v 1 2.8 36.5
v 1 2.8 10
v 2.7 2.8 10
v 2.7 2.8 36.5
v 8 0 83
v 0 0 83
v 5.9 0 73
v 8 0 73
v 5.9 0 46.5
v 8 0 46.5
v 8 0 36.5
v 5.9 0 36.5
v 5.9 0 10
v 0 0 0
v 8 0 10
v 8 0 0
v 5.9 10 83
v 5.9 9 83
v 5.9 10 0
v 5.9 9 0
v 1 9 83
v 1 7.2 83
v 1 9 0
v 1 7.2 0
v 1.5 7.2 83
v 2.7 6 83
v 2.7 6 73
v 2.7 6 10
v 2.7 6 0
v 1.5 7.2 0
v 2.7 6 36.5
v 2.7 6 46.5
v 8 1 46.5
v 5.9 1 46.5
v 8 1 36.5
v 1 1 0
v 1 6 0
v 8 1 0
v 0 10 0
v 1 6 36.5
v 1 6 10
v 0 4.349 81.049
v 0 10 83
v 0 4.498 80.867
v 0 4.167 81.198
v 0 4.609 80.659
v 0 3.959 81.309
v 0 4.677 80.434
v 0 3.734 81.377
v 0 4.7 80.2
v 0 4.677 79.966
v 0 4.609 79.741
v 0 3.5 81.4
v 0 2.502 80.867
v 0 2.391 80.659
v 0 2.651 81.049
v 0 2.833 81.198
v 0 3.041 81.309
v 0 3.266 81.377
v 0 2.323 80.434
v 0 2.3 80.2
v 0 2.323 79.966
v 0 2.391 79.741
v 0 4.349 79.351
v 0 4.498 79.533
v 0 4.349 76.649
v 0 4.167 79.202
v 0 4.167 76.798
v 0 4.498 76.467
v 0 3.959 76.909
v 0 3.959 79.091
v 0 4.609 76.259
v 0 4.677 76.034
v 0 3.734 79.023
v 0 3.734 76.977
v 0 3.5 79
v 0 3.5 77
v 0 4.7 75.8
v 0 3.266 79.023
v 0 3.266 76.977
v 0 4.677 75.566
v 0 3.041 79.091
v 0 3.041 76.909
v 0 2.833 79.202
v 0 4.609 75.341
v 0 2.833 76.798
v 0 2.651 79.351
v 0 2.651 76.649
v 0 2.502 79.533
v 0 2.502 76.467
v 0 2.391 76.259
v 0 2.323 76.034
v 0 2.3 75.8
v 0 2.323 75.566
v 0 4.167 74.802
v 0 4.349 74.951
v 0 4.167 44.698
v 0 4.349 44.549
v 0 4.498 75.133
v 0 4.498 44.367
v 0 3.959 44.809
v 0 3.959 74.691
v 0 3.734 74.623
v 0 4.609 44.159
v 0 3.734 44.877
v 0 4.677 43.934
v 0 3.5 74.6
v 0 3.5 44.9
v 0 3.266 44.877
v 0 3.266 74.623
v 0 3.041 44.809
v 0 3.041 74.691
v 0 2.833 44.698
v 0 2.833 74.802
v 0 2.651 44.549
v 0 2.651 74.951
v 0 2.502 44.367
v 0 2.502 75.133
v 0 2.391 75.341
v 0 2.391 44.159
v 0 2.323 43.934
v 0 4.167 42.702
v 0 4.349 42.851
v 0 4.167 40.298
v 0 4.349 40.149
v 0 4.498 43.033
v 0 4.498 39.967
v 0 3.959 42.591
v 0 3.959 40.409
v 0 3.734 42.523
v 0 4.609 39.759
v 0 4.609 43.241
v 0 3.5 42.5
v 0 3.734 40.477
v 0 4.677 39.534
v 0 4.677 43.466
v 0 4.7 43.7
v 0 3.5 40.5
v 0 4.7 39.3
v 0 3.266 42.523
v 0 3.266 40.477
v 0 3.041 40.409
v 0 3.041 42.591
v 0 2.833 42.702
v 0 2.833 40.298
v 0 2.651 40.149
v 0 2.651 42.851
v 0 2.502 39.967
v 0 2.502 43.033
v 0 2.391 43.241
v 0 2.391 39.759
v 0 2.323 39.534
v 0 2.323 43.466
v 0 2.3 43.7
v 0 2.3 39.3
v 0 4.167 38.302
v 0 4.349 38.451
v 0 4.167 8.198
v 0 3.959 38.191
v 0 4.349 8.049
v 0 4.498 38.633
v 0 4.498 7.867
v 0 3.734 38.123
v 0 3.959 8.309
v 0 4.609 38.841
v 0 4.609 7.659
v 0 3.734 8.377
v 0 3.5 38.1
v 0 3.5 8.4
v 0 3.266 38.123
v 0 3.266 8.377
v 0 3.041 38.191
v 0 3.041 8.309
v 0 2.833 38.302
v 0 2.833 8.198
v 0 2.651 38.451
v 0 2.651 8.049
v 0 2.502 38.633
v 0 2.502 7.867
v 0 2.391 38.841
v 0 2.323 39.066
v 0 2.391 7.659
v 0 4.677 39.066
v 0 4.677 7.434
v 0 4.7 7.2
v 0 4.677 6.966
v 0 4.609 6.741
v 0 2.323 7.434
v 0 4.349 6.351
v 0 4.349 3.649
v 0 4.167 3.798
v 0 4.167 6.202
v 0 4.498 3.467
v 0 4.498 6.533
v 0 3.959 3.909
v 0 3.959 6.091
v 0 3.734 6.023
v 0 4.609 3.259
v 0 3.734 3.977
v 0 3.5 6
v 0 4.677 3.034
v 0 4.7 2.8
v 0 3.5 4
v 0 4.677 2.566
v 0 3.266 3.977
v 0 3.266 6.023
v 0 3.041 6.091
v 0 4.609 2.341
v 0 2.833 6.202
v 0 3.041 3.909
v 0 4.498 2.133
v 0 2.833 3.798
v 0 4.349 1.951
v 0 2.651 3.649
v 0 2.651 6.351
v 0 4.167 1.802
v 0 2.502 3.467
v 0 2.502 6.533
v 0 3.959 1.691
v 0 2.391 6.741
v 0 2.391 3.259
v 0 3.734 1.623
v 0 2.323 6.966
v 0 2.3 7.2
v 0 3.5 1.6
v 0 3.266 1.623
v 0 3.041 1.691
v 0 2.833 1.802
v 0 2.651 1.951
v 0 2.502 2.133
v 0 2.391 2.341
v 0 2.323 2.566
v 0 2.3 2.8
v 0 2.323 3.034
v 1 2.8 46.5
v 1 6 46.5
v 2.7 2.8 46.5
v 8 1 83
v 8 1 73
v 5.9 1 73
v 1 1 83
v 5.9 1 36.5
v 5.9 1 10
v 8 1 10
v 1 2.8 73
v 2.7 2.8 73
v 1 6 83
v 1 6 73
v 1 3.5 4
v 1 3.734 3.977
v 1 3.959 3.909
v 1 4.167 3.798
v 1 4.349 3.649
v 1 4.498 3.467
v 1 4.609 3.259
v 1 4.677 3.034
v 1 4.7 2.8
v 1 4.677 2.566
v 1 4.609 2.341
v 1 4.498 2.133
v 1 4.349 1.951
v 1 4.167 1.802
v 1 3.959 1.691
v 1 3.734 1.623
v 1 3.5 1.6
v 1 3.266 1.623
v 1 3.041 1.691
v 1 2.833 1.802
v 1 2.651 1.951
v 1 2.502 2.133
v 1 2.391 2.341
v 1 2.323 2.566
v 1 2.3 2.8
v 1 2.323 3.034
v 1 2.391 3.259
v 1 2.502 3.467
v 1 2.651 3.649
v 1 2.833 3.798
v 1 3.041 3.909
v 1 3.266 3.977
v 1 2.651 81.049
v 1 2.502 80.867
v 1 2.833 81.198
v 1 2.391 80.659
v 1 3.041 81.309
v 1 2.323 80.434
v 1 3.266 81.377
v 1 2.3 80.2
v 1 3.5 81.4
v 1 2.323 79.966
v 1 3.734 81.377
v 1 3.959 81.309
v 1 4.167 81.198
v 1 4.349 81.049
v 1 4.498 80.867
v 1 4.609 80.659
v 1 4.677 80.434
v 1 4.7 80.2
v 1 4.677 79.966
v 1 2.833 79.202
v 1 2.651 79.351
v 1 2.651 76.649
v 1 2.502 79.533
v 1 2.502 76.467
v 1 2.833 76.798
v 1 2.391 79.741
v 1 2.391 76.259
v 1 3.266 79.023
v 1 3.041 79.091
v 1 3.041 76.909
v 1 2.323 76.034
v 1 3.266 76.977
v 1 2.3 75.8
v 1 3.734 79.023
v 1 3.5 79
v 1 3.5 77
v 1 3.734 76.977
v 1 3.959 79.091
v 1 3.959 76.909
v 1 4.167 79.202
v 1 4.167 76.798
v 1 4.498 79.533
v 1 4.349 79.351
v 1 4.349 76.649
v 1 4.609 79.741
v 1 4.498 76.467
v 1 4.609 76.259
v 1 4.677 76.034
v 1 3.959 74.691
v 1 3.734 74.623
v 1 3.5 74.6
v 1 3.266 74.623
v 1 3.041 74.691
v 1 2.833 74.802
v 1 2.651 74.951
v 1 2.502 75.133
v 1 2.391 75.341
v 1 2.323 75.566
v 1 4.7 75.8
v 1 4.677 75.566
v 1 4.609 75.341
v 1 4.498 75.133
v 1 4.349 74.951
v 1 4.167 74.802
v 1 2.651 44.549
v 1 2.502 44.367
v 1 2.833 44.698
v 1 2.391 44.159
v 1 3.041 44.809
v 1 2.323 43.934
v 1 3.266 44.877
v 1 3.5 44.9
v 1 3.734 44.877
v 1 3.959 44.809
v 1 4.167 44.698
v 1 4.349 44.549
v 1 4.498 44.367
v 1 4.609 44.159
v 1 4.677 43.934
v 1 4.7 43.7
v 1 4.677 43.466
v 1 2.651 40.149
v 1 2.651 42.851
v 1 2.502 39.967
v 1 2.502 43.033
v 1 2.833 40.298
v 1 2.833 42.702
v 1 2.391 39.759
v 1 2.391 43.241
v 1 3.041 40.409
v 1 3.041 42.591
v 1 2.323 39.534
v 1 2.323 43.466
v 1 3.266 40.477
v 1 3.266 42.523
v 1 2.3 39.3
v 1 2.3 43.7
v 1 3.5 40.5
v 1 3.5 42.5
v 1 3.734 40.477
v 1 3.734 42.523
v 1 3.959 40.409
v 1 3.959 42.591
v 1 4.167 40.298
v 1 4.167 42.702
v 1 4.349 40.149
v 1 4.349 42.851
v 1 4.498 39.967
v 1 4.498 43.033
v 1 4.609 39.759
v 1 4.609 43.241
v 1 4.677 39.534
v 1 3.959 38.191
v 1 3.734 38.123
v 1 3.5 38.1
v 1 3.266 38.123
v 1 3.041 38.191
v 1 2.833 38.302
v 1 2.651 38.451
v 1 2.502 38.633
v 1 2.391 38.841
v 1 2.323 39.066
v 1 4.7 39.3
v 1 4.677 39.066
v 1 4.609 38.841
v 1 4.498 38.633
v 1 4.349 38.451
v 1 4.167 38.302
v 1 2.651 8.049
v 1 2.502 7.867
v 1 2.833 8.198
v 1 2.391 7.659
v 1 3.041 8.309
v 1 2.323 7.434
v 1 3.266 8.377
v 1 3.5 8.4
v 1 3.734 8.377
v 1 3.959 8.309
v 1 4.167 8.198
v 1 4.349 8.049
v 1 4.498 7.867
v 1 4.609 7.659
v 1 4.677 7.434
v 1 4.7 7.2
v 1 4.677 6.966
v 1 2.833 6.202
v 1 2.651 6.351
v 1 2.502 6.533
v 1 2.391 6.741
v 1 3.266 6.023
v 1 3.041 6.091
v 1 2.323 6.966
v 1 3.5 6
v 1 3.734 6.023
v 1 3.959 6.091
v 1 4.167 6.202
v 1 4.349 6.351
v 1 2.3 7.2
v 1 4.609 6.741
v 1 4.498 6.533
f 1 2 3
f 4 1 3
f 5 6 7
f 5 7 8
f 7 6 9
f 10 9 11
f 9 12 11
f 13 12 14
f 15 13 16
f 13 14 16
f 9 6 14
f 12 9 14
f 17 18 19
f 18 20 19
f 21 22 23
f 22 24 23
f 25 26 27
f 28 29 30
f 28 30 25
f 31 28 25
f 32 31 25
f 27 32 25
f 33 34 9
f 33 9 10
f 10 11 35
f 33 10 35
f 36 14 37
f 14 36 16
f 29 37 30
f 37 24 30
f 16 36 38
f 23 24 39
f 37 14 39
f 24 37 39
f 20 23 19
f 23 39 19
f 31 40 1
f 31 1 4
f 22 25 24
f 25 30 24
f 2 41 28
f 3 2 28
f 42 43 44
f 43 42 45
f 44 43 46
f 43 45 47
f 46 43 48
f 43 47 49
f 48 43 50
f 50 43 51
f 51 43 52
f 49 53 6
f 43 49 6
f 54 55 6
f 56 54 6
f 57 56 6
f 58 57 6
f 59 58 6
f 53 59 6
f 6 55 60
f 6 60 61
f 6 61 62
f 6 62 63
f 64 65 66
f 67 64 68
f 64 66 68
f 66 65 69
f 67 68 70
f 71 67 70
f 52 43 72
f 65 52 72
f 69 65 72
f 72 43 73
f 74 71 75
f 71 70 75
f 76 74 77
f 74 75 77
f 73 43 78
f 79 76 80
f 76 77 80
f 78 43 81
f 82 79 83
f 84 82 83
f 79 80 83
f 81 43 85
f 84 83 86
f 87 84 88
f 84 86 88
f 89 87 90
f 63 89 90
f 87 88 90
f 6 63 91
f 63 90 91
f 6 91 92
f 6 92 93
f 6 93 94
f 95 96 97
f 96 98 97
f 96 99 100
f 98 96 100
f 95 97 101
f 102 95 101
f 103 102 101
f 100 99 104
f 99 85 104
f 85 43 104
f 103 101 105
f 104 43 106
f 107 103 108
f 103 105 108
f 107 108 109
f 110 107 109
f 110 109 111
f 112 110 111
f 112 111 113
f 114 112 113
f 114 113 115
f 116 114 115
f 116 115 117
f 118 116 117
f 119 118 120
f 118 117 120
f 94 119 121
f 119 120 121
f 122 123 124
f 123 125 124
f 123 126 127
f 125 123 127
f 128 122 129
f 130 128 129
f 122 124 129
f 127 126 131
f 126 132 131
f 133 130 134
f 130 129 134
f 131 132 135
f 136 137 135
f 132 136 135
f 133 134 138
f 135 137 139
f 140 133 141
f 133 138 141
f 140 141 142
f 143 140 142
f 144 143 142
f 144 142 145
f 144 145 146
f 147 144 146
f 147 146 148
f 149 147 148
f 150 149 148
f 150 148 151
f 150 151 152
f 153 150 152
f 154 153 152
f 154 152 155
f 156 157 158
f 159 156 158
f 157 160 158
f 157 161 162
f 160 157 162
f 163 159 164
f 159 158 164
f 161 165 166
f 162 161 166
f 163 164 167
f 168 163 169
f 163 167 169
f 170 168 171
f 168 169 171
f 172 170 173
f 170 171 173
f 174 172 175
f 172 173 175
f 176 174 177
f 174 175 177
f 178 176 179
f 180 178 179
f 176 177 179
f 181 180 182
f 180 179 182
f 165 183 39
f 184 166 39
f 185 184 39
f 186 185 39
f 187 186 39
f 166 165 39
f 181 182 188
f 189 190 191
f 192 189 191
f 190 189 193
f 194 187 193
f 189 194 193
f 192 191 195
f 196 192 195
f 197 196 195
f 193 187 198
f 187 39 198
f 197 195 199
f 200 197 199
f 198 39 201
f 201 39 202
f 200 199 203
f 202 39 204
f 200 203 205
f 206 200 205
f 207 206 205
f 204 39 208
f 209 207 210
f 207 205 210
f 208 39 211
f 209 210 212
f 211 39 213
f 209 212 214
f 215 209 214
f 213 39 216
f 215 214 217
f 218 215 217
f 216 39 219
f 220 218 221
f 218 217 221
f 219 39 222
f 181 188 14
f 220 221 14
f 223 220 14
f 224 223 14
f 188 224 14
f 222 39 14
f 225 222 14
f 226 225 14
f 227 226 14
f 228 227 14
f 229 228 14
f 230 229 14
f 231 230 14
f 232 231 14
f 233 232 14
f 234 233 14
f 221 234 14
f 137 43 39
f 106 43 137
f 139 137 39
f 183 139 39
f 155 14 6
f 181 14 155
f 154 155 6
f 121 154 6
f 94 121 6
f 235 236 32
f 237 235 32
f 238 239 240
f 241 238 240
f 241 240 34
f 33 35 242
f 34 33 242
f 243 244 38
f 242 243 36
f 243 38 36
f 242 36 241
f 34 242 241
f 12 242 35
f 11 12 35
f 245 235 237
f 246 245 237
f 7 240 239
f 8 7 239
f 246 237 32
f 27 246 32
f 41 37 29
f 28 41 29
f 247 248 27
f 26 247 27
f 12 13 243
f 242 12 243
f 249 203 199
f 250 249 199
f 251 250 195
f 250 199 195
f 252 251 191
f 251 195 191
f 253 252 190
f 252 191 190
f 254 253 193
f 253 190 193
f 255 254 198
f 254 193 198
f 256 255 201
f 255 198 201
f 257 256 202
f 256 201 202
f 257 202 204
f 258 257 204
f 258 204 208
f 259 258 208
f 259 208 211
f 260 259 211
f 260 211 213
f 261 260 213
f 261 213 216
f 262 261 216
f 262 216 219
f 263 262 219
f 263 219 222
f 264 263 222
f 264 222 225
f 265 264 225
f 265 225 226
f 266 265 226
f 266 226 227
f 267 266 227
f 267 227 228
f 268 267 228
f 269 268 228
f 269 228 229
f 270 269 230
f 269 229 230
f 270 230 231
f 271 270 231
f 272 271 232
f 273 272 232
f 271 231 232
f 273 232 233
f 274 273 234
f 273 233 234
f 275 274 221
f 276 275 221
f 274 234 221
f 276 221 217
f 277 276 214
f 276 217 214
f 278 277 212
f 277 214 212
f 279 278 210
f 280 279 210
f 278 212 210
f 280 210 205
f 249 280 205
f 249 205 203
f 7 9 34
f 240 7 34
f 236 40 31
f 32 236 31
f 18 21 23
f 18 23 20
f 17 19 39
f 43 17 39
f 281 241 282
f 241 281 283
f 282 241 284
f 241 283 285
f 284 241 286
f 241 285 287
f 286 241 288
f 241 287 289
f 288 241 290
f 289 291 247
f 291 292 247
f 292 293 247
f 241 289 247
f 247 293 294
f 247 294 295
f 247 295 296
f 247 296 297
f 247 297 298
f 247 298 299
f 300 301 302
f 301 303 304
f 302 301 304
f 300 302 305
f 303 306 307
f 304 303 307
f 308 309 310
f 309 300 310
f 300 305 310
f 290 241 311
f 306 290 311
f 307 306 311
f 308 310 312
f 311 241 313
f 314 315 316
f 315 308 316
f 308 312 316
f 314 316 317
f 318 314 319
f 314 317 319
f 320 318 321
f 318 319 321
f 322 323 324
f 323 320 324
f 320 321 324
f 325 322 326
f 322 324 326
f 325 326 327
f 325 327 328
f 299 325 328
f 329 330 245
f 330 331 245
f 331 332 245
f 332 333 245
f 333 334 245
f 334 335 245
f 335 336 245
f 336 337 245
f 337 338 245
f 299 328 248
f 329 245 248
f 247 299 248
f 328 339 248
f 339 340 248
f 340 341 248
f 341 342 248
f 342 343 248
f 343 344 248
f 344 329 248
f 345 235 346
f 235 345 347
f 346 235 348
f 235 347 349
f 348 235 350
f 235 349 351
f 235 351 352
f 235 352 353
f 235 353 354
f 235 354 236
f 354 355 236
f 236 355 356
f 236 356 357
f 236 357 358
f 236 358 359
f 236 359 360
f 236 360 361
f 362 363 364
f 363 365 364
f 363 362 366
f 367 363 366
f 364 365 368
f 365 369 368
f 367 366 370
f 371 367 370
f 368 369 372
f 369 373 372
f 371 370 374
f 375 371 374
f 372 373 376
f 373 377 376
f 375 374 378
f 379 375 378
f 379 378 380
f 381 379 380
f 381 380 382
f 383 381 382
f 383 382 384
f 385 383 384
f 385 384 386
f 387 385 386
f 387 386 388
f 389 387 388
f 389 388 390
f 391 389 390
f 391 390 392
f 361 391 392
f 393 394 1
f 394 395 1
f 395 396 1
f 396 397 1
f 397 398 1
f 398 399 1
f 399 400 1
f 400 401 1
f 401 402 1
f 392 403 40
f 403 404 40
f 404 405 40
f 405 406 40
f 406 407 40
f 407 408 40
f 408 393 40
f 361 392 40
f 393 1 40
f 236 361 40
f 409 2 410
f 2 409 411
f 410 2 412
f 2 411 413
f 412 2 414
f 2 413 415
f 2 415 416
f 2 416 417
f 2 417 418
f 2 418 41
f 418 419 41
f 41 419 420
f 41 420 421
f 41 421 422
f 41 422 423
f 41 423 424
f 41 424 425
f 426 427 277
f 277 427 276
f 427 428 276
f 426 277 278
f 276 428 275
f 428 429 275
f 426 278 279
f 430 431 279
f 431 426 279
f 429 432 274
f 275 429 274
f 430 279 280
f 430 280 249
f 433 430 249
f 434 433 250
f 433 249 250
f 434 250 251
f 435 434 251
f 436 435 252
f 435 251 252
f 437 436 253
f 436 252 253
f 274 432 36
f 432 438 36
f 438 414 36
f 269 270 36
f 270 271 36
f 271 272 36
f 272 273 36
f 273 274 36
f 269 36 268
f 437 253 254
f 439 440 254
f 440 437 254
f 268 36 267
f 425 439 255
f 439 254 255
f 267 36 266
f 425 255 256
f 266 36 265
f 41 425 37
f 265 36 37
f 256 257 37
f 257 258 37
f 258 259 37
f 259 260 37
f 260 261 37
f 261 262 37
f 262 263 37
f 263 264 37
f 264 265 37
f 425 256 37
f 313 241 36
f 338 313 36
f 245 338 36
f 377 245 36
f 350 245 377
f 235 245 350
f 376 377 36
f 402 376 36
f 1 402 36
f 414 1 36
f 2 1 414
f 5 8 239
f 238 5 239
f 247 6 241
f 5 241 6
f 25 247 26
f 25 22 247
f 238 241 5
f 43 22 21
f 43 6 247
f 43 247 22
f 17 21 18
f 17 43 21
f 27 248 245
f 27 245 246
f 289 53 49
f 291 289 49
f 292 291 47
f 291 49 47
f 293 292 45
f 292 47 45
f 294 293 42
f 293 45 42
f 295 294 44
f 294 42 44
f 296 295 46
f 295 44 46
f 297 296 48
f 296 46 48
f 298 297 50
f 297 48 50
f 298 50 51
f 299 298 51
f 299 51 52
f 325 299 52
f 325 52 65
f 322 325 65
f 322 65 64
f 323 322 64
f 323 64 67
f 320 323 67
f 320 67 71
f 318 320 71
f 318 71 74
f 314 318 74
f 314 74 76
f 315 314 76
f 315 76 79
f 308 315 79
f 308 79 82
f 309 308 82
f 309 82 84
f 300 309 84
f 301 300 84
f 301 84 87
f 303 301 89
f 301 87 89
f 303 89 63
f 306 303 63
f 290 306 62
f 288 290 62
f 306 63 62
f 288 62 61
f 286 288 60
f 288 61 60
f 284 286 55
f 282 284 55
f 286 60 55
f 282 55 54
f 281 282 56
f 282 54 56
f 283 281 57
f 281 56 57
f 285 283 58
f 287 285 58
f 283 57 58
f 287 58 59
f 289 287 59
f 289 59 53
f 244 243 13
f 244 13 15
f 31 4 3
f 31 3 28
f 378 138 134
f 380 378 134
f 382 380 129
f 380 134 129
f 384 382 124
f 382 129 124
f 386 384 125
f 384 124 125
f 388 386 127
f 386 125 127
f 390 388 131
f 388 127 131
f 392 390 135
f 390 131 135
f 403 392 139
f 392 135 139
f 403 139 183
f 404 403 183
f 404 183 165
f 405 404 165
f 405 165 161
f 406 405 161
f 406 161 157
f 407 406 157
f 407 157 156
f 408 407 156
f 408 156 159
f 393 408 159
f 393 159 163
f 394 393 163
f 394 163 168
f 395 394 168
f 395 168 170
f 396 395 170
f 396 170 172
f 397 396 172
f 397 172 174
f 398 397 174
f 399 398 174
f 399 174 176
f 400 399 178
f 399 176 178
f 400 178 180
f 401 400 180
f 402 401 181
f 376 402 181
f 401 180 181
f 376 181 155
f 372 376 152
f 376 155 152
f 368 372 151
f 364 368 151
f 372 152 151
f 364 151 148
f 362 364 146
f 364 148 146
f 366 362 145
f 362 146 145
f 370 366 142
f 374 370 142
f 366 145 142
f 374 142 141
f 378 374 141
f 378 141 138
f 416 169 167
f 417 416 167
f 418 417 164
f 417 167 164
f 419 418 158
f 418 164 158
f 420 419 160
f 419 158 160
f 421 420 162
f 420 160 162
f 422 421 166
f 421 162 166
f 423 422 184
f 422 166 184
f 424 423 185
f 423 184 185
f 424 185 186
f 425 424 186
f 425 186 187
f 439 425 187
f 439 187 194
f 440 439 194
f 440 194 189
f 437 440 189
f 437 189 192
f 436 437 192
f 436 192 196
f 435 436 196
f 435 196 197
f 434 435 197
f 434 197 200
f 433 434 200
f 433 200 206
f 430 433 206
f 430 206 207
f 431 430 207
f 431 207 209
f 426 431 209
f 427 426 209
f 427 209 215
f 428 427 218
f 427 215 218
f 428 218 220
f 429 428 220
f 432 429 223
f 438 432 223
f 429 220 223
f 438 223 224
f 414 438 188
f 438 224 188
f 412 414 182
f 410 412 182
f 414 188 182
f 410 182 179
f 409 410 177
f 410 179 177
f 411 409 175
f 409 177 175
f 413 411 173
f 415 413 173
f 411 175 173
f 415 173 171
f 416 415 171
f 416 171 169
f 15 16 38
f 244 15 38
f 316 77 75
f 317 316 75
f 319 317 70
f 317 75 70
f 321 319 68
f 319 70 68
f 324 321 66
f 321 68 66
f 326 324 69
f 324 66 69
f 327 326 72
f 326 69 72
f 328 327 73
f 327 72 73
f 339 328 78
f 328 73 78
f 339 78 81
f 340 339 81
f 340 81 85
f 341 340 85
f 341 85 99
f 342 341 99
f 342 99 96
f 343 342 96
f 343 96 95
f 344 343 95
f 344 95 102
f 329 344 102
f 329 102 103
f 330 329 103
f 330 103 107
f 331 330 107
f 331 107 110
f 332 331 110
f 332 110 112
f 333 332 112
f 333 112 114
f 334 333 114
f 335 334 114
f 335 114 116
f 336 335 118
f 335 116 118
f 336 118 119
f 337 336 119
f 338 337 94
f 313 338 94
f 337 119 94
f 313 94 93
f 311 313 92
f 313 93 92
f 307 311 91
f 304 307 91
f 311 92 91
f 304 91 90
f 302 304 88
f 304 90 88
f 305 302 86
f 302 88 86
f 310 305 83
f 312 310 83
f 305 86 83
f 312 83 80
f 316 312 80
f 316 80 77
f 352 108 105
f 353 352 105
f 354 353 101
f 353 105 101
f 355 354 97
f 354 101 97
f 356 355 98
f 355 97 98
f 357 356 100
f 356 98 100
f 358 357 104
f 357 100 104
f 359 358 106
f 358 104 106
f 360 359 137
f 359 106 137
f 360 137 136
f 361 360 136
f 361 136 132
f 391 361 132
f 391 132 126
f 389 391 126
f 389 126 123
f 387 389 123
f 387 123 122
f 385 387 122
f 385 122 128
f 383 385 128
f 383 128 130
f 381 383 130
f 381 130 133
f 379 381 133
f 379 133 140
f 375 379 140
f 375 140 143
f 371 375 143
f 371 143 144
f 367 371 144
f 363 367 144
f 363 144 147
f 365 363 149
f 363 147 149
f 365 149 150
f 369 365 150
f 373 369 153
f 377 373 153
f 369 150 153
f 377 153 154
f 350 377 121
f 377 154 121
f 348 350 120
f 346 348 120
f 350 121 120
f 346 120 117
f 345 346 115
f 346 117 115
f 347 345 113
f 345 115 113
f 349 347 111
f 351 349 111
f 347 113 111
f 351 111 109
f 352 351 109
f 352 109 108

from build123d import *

# Parameters (mm, degrees)
BOSS_EXTRUDE1_DEPTH  = 10
BOSS_EXTRUDE2_DEPTH  = 26.5
BOSS_EXTRUDE3_DEPTH  = 10
BOSS_EXTRUDE4_DEPTH  = 26.5
BOSS_EXTRUDE5_DEPTH  = 10
M2_CLEARANCE_HOLE1_D = 2.4


with BuildPart() as part:
    # Sketch2 → Boss-Extrude1 (new body)
    with BuildSketch(Plane.XY):
        Polygon((0, 0), (8, 0), (8, 1), (1, 1), (1, 6), (2.7, 6), (1.5, 7.2), (1, 7.2), (1, 9), (5.9, 9), (5.9, 10), (0, 10), align=None)
    extrude(amount=BOSS_EXTRUDE1_DEPTH)

    # Sketch6 → Boss-Extrude2 (add)
    with BuildSketch(Plane.XY.offset(10)):
        Polygon((0, 0), (5.9, 0), (5.9, 1), (1, 1), (1, 2.8), (2.7, 2.8), (2.7, 6), (1.5, 7.2), (1, 7.2), (1, 9), (5.9, 9), (5.9, 10), (0, 10), align=None)
    extrude(amount=BOSS_EXTRUDE2_DEPTH)

    # Sketch8 → Boss-Extrude3 (add)
    with BuildSketch(Plane.XY.offset(36.5)):
        Polygon((0, 0), (8, 0), (8, 1), (1, 1), (1, 6), (2.7, 6), (1.5, 7.2), (1, 7.2), (1, 9), (5.9, 9), (5.9, 10), (0, 10), align=None)
    extrude(amount=BOSS_EXTRUDE3_DEPTH)

    # Sketch9 → Boss-Extrude4 (add)
    with BuildSketch(Plane.XY.offset(46.5)):
        Polygon((0, 0), (5.9, 0), (5.9, 1), (1, 1), (1, 2.8), (2.7, 2.8), (2.7, 6), (1.5, 7.2), (1, 7.2), (1, 9), (5.9, 9), (5.9, 10), (0, 10), align=None)
    extrude(amount=BOSS_EXTRUDE4_DEPTH)

    # Sketch10 → Boss-Extrude5 (add)
    with BuildSketch(Plane.XY.offset(73)):
        Polygon((0, 0), (8, 0), (8, 1), (1, 1), (1, 6), (2.7, 6), (1.5, 7.2), (1, 7.2), (1, 9), (5.9, 9), (5.9, 10), (0, 10), align=None)
    extrude(amount=BOSS_EXTRUDE5_DEPTH)

    # M2 Clearance Hole1 (through all)
    with Locations(Plane(origin=(1, 0, 0), x_dir=(0, 0, -1), z_dir=(1, 0, 0))):
        with Locations((-2.8, 3.5), (-7.2, 3.5), (-39.3, 3.5), (-43.7, 3.5), (-75.8, 3.5), (-80.2, 3.5)):
            Hole(M2_CLEARANCE_HOLE1_D / 2)


solid = part.part
